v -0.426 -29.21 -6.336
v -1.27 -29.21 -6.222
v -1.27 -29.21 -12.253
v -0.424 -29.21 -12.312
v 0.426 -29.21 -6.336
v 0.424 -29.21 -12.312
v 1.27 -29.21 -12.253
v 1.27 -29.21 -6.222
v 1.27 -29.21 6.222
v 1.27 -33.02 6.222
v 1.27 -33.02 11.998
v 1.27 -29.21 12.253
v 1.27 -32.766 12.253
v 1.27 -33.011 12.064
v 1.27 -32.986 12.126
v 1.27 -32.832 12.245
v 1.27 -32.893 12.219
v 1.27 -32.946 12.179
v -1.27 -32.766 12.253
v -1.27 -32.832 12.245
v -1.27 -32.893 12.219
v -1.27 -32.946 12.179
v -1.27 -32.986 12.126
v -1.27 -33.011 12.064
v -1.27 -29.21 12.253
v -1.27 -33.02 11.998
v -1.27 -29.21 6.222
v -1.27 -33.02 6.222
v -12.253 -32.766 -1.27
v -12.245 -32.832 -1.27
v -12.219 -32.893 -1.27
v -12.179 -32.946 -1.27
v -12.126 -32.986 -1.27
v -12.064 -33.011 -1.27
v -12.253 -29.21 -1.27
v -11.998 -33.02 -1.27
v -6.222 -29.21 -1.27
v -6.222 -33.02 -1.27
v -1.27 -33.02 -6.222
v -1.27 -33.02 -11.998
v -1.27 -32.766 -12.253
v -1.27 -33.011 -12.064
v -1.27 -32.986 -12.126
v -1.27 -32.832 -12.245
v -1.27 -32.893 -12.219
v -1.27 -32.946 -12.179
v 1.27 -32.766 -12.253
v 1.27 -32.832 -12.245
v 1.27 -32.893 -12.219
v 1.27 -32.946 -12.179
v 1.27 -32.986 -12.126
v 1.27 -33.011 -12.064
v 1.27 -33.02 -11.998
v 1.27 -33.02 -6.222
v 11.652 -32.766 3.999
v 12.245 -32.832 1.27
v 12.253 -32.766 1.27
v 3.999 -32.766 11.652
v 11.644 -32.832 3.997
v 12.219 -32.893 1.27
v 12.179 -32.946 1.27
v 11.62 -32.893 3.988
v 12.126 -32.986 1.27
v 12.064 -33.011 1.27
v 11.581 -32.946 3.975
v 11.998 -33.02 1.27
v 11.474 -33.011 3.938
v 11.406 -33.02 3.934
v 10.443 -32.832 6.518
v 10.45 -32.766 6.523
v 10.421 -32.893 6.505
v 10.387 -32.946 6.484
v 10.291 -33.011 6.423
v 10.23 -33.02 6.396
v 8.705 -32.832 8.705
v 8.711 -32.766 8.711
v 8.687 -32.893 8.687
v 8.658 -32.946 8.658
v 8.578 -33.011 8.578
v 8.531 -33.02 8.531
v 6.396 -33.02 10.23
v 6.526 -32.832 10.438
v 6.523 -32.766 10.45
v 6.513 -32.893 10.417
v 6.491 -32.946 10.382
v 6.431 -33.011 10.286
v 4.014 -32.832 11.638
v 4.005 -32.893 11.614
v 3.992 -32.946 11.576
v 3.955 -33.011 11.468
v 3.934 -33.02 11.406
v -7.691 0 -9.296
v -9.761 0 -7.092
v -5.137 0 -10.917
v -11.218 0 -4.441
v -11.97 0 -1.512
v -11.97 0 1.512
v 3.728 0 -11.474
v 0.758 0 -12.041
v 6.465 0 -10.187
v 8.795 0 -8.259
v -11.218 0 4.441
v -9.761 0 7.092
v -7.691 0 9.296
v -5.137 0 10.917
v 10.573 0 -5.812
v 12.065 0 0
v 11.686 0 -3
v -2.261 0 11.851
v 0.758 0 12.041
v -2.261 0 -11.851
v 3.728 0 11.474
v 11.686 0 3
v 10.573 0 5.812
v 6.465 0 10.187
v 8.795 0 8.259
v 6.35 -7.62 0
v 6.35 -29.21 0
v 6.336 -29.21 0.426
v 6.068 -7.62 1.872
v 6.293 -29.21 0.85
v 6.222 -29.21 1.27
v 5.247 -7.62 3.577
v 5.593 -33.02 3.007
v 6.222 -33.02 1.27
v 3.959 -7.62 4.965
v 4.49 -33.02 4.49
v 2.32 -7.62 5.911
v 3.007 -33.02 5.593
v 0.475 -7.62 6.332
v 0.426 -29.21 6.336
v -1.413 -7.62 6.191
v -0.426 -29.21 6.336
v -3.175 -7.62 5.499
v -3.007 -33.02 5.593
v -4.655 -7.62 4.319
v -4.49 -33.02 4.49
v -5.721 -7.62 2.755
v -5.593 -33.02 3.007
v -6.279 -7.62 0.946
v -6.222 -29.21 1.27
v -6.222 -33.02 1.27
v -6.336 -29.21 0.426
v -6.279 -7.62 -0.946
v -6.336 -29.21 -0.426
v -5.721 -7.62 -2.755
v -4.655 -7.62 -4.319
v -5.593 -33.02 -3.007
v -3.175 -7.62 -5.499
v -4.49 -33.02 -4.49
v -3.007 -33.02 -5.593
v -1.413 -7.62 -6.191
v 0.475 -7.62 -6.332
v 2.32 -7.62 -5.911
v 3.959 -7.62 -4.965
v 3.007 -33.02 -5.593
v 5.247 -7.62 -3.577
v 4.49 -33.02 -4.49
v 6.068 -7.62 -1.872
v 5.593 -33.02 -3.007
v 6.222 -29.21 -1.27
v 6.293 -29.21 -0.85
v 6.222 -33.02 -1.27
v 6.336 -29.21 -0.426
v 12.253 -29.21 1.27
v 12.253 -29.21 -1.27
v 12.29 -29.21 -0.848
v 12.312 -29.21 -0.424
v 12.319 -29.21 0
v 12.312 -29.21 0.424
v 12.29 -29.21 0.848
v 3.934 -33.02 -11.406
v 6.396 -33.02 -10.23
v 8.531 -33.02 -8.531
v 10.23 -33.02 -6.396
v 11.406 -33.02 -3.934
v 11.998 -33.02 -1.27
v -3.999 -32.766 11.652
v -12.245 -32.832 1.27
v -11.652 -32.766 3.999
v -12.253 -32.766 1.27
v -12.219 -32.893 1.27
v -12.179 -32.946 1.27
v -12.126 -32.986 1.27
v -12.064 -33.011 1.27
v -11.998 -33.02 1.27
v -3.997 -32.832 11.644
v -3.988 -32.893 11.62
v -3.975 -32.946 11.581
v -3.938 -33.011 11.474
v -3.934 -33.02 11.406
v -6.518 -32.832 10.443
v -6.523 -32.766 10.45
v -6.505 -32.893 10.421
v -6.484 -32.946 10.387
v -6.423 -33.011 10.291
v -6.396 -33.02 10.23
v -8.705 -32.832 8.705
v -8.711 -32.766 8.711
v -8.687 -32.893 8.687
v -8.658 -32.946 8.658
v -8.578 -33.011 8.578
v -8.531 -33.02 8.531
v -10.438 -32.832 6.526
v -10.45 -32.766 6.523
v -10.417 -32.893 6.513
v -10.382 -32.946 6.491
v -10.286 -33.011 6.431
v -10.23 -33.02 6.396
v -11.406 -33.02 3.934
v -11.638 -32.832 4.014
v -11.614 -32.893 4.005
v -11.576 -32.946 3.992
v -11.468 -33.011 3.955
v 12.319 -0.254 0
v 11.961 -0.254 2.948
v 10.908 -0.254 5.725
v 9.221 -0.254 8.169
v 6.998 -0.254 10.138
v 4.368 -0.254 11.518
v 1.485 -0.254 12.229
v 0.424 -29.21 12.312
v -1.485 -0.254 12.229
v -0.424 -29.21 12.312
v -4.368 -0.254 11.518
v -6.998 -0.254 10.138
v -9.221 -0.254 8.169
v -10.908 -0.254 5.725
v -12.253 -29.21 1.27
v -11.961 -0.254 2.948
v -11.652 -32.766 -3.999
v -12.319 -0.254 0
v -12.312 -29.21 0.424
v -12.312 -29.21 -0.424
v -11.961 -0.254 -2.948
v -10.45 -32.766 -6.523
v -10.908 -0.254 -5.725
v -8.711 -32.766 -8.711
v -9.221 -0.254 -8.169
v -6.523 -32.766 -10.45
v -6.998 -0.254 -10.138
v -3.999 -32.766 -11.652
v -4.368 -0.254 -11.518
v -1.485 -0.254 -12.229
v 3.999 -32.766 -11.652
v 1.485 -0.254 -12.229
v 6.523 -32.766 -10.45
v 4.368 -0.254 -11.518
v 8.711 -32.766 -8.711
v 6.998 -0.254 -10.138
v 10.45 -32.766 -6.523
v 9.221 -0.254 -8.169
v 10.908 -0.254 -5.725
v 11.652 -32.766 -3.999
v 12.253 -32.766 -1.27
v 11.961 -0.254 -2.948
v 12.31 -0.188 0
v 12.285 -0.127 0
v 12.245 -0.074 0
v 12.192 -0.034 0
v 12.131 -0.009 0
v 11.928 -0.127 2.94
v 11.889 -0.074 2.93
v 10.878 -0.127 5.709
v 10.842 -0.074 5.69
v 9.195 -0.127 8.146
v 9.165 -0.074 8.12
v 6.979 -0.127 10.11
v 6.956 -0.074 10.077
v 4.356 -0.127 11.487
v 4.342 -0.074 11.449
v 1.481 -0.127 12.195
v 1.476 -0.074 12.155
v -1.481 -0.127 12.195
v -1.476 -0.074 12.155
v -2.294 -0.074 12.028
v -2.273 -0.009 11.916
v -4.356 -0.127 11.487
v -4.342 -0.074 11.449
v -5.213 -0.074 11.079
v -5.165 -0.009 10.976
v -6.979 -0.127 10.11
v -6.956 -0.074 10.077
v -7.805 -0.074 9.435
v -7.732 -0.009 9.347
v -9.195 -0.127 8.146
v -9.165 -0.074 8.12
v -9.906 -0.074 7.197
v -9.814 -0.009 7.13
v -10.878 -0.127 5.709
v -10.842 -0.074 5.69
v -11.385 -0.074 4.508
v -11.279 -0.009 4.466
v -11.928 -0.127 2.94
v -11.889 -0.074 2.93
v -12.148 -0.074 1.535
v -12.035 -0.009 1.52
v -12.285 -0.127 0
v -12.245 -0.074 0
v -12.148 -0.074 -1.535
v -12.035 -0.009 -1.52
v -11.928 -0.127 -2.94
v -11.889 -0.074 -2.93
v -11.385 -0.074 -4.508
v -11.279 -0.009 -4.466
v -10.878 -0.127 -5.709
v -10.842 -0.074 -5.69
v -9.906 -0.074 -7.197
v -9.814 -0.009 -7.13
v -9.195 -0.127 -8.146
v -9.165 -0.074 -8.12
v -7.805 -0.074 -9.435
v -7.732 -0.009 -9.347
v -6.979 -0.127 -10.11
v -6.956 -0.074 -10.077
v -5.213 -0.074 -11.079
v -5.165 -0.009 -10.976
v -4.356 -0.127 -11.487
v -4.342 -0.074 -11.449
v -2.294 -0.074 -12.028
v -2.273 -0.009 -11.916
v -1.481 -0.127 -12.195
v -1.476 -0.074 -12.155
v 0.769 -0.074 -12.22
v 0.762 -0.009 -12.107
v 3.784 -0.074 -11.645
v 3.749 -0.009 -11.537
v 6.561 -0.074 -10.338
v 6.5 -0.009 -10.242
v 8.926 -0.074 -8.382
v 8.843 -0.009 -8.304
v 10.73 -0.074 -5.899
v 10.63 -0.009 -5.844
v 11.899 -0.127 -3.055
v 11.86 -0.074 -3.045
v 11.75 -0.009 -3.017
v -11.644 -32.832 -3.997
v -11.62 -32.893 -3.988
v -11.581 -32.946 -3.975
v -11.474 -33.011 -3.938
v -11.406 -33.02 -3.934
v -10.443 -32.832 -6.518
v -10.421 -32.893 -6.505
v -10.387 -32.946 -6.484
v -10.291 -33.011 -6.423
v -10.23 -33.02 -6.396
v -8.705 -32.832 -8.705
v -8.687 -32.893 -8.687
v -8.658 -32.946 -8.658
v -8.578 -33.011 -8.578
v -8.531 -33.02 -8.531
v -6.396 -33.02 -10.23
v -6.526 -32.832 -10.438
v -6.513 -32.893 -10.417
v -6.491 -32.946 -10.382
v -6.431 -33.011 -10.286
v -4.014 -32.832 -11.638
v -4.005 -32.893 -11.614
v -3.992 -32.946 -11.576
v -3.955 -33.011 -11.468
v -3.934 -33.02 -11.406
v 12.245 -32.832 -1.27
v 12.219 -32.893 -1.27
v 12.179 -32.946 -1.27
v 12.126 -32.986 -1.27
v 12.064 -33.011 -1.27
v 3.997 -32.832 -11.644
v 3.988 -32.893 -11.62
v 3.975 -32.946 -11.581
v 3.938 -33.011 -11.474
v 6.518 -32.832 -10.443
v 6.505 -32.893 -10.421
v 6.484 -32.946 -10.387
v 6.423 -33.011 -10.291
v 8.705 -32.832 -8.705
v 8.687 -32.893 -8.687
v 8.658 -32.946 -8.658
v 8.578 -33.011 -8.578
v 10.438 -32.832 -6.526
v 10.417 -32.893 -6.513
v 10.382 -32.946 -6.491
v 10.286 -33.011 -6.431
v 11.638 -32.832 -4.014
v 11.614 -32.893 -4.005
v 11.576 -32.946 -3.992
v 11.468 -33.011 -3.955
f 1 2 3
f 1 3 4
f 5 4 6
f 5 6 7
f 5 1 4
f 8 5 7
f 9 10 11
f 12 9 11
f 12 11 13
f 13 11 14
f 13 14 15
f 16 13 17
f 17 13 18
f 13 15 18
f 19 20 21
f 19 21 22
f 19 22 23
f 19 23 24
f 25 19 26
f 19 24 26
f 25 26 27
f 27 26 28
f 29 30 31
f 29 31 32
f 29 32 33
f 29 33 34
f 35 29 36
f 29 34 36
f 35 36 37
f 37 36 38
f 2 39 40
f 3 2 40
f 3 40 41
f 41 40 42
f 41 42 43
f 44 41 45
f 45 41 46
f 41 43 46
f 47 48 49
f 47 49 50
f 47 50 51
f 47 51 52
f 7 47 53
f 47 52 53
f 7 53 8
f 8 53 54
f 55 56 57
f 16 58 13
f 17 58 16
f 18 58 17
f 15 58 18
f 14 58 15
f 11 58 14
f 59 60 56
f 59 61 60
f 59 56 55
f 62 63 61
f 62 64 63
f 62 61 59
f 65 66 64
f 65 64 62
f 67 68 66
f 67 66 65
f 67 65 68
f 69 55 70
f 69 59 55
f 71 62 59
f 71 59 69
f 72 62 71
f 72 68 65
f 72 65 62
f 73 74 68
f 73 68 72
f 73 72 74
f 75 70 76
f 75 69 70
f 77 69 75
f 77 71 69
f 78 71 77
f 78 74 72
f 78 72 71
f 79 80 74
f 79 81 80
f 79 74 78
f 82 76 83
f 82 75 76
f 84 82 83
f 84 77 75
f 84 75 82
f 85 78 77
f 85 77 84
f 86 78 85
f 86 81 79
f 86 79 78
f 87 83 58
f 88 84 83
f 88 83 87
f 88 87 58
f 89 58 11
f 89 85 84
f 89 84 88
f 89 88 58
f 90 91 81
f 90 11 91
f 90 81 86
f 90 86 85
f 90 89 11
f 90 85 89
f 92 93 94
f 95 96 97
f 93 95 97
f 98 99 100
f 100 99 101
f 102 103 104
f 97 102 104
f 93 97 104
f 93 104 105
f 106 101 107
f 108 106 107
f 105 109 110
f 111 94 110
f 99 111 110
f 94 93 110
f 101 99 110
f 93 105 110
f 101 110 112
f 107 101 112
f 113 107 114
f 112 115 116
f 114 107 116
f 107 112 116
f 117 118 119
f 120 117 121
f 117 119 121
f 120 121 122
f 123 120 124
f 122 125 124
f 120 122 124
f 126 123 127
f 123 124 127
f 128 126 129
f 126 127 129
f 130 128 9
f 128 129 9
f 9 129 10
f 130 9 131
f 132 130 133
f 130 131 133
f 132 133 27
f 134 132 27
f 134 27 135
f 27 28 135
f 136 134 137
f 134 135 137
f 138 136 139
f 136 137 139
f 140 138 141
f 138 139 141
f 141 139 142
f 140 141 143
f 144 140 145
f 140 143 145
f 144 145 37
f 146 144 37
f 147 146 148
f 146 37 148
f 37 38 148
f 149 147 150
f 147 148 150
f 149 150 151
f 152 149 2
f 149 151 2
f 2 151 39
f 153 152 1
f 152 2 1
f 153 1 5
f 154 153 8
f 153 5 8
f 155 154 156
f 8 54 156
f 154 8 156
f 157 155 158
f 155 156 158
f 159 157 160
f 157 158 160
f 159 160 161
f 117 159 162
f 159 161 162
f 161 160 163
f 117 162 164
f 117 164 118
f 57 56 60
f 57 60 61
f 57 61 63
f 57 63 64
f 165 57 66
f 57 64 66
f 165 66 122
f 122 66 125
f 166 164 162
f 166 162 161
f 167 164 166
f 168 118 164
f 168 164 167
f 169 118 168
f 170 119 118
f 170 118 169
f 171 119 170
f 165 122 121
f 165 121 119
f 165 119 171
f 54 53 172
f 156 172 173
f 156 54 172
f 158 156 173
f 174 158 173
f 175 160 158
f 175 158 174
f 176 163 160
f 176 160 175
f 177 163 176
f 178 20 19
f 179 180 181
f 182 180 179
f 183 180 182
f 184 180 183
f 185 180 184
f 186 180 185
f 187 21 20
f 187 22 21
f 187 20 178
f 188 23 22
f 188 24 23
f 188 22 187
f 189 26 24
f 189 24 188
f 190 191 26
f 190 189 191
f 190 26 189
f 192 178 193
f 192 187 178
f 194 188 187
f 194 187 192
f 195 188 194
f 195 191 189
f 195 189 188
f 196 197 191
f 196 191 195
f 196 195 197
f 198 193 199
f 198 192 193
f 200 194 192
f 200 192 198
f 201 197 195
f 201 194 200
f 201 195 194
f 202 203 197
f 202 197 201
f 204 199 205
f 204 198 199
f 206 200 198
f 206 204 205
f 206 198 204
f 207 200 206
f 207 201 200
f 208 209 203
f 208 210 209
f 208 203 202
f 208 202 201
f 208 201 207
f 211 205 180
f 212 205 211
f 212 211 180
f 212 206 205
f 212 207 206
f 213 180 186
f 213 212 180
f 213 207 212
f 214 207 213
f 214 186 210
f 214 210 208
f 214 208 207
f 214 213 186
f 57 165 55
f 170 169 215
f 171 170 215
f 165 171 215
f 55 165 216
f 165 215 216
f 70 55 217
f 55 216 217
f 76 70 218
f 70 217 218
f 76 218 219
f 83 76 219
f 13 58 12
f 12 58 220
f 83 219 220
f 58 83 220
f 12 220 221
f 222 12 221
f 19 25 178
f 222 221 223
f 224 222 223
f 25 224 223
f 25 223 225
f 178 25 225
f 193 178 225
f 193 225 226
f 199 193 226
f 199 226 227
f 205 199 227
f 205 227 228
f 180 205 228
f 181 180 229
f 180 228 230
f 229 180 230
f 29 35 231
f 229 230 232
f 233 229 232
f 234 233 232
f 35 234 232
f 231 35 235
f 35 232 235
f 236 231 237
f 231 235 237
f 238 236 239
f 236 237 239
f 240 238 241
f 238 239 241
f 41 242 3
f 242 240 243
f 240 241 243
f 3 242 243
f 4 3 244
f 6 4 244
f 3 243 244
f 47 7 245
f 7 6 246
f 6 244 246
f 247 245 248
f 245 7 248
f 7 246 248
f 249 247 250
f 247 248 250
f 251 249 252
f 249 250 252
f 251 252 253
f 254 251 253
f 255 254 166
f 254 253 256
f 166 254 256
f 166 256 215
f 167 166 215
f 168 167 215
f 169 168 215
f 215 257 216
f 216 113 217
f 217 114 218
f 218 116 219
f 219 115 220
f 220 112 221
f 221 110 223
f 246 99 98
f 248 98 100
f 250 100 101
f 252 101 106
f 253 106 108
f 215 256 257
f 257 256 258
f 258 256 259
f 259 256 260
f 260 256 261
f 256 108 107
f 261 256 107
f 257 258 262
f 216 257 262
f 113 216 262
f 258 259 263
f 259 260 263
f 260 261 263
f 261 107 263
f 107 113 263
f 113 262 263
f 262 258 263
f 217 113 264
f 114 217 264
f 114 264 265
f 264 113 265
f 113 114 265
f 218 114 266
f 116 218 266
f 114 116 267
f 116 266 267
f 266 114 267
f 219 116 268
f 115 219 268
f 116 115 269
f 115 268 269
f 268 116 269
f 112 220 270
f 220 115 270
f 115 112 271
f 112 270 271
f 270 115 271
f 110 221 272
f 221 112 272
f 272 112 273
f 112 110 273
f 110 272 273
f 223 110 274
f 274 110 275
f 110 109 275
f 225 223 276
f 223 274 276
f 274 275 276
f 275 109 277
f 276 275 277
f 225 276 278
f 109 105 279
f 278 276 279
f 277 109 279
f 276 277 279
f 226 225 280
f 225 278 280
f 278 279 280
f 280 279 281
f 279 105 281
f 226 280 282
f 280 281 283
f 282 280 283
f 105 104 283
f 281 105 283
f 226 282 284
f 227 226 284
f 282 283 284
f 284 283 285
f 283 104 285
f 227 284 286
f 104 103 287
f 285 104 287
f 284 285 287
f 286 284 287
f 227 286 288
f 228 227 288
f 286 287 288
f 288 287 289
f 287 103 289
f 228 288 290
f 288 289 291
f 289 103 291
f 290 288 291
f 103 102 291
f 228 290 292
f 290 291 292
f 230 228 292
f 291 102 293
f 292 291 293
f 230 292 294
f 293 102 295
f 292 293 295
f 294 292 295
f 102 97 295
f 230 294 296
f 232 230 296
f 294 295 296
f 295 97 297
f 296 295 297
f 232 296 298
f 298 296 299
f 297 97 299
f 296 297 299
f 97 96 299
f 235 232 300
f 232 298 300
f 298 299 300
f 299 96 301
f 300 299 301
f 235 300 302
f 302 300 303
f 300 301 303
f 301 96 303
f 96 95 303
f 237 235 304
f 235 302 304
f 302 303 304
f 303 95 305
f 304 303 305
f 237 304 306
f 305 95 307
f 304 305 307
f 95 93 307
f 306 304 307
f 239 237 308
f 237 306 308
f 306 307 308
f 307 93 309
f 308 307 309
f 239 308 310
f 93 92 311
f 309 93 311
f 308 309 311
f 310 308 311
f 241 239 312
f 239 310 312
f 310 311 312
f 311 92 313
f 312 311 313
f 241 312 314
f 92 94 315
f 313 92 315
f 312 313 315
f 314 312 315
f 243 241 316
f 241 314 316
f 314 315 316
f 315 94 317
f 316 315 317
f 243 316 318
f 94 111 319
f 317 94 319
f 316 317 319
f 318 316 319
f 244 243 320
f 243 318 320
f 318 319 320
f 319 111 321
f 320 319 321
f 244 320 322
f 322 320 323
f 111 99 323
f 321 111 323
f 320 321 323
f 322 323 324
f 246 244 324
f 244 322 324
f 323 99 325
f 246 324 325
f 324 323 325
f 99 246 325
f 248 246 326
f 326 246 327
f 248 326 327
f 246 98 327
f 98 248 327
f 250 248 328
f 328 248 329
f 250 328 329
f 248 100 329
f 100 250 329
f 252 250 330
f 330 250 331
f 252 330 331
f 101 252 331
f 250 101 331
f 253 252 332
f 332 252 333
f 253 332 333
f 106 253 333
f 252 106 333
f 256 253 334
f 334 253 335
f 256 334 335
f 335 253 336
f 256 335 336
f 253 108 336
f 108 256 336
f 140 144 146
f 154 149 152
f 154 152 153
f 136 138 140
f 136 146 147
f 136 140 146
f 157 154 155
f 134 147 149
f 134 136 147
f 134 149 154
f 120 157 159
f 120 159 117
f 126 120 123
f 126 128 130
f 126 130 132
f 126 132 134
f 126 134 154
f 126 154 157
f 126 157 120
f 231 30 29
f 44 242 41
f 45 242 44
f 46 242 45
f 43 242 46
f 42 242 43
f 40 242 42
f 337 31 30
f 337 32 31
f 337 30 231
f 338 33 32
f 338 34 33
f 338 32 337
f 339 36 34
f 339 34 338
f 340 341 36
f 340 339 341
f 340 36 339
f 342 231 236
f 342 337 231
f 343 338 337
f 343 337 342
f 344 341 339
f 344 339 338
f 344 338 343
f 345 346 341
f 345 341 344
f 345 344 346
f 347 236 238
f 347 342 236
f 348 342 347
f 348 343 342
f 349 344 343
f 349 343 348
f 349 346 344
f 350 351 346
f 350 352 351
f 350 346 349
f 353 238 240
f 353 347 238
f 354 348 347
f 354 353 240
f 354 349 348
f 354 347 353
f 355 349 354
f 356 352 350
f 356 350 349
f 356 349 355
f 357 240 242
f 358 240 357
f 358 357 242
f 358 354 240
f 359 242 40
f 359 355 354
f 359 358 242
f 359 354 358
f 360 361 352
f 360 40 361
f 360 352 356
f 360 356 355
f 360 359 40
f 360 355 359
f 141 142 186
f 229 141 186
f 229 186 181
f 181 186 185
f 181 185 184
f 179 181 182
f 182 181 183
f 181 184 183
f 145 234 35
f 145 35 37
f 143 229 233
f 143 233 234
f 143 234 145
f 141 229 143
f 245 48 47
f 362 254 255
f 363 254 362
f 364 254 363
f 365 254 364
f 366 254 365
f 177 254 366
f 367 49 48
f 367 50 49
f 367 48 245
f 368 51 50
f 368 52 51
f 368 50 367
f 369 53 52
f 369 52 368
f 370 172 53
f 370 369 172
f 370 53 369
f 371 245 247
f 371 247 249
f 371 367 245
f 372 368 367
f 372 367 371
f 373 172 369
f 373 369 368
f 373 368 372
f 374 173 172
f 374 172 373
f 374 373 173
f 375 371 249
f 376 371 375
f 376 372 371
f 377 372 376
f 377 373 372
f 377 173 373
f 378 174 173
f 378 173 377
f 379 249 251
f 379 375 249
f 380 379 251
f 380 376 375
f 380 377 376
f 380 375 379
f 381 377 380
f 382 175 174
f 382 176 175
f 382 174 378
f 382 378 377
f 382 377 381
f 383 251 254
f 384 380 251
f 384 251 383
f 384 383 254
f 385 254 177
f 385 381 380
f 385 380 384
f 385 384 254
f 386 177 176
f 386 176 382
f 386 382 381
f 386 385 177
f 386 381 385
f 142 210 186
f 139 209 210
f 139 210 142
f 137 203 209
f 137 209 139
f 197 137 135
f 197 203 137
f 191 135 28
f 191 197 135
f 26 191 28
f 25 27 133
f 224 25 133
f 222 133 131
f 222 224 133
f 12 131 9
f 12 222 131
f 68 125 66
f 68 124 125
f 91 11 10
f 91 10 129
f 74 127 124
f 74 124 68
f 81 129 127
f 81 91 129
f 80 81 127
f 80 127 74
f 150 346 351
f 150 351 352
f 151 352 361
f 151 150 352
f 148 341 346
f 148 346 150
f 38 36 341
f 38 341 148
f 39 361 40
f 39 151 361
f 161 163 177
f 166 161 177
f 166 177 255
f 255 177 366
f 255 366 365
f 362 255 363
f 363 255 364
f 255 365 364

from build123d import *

# Parameters (mm, degrees)
F0_R     = 12.319
F1_DEPTH = 33.02
F3_R     = 6.35
F4_DEPTH = 25.4
F5_R     = 0.254
F7_DEPTH = 3.81


with BuildPart() as f1:
    # F0 (on Front) → F1 (new body)
    with BuildSketch(Plane.XZ):
        Circle(F0_R)
    extrude(amount=F1_DEPTH)

    # F3 (on face) → F4 (cut)
    with BuildSketch(Plane.XZ.offset(33.02)):
        Circle(F3_R)
    extrude(amount=-F4_DEPTH, mode=Mode.SUBTRACT)

    # F5
    f5_edges = [f1.edges().sort_by_distance(p)[0] for p in [
        (-12.319, -33.02, 0),
        (-12.319, 0, 0),
    ]]
    fillet(f5_edges, radius=F5_R)

    # F6 (on face) → F7 (cut)
    with BuildSketch(Plane.XZ.offset(33.02)):
        with BuildLine():
            ThreePointArc((-1.27, 6.2217039467), (0, 6.35), (1.27, 6.2217039467))
            Line((1.27, 6.2217039467), (1.27, 12.2533612123))
            ThreePointArc((1.27, 12.2533612123), (0, 12.319), (-1.27, 12.2533612123))
            Line((-1.27, 12.2533612123), (-1.27, 6.2217039467))
        make_face()
        with BuildLine():
            Line((-6.2217039467, 1.27), (-12.2533612123, 1.27))
            ThreePointArc((-12.2533612123, 1.27), (-12.319, 0), (-12.2533612123, -1.27))
            Line((-12.2533612123, -1.27), (-6.2217039467, -1.27))
            ThreePointArc((-6.2217039467, -1.27), (-6.35, 0), (-6.2217039467, 1.27))
        make_face()
        with BuildLine():
            Line((-1.27, -6.2217039467), (-1.27, -12.2533612123))
            ThreePointArc((-1.27, -12.2533612123), (0, -12.319), (1.27, -12.2533612123))
            Line((1.27, -12.2533612123), (1.27, -6.2217039467))
            ThreePointArc((1.27, -6.2217039467), (0, -6.35), (-1.27, -6.2217039467))
        make_face()
        with BuildLine():
            Line((6.2217039467, -1.27), (12.2533612123, -1.27))
            ThreePointArc((12.2533612123, -1.27), (12.319, 0), (12.2533612123, 1.27))
            Line((12.2533612123, 1.27), (6.2217039467, 1.27))
            ThreePointArc((6.2217039467, 1.27), (6.35, 0), (6.2217039467, -1.27))
        make_face()
    extrude(amount=-F7_DEPTH, mode=Mode.SUBTRACT)


solid = f1.part
